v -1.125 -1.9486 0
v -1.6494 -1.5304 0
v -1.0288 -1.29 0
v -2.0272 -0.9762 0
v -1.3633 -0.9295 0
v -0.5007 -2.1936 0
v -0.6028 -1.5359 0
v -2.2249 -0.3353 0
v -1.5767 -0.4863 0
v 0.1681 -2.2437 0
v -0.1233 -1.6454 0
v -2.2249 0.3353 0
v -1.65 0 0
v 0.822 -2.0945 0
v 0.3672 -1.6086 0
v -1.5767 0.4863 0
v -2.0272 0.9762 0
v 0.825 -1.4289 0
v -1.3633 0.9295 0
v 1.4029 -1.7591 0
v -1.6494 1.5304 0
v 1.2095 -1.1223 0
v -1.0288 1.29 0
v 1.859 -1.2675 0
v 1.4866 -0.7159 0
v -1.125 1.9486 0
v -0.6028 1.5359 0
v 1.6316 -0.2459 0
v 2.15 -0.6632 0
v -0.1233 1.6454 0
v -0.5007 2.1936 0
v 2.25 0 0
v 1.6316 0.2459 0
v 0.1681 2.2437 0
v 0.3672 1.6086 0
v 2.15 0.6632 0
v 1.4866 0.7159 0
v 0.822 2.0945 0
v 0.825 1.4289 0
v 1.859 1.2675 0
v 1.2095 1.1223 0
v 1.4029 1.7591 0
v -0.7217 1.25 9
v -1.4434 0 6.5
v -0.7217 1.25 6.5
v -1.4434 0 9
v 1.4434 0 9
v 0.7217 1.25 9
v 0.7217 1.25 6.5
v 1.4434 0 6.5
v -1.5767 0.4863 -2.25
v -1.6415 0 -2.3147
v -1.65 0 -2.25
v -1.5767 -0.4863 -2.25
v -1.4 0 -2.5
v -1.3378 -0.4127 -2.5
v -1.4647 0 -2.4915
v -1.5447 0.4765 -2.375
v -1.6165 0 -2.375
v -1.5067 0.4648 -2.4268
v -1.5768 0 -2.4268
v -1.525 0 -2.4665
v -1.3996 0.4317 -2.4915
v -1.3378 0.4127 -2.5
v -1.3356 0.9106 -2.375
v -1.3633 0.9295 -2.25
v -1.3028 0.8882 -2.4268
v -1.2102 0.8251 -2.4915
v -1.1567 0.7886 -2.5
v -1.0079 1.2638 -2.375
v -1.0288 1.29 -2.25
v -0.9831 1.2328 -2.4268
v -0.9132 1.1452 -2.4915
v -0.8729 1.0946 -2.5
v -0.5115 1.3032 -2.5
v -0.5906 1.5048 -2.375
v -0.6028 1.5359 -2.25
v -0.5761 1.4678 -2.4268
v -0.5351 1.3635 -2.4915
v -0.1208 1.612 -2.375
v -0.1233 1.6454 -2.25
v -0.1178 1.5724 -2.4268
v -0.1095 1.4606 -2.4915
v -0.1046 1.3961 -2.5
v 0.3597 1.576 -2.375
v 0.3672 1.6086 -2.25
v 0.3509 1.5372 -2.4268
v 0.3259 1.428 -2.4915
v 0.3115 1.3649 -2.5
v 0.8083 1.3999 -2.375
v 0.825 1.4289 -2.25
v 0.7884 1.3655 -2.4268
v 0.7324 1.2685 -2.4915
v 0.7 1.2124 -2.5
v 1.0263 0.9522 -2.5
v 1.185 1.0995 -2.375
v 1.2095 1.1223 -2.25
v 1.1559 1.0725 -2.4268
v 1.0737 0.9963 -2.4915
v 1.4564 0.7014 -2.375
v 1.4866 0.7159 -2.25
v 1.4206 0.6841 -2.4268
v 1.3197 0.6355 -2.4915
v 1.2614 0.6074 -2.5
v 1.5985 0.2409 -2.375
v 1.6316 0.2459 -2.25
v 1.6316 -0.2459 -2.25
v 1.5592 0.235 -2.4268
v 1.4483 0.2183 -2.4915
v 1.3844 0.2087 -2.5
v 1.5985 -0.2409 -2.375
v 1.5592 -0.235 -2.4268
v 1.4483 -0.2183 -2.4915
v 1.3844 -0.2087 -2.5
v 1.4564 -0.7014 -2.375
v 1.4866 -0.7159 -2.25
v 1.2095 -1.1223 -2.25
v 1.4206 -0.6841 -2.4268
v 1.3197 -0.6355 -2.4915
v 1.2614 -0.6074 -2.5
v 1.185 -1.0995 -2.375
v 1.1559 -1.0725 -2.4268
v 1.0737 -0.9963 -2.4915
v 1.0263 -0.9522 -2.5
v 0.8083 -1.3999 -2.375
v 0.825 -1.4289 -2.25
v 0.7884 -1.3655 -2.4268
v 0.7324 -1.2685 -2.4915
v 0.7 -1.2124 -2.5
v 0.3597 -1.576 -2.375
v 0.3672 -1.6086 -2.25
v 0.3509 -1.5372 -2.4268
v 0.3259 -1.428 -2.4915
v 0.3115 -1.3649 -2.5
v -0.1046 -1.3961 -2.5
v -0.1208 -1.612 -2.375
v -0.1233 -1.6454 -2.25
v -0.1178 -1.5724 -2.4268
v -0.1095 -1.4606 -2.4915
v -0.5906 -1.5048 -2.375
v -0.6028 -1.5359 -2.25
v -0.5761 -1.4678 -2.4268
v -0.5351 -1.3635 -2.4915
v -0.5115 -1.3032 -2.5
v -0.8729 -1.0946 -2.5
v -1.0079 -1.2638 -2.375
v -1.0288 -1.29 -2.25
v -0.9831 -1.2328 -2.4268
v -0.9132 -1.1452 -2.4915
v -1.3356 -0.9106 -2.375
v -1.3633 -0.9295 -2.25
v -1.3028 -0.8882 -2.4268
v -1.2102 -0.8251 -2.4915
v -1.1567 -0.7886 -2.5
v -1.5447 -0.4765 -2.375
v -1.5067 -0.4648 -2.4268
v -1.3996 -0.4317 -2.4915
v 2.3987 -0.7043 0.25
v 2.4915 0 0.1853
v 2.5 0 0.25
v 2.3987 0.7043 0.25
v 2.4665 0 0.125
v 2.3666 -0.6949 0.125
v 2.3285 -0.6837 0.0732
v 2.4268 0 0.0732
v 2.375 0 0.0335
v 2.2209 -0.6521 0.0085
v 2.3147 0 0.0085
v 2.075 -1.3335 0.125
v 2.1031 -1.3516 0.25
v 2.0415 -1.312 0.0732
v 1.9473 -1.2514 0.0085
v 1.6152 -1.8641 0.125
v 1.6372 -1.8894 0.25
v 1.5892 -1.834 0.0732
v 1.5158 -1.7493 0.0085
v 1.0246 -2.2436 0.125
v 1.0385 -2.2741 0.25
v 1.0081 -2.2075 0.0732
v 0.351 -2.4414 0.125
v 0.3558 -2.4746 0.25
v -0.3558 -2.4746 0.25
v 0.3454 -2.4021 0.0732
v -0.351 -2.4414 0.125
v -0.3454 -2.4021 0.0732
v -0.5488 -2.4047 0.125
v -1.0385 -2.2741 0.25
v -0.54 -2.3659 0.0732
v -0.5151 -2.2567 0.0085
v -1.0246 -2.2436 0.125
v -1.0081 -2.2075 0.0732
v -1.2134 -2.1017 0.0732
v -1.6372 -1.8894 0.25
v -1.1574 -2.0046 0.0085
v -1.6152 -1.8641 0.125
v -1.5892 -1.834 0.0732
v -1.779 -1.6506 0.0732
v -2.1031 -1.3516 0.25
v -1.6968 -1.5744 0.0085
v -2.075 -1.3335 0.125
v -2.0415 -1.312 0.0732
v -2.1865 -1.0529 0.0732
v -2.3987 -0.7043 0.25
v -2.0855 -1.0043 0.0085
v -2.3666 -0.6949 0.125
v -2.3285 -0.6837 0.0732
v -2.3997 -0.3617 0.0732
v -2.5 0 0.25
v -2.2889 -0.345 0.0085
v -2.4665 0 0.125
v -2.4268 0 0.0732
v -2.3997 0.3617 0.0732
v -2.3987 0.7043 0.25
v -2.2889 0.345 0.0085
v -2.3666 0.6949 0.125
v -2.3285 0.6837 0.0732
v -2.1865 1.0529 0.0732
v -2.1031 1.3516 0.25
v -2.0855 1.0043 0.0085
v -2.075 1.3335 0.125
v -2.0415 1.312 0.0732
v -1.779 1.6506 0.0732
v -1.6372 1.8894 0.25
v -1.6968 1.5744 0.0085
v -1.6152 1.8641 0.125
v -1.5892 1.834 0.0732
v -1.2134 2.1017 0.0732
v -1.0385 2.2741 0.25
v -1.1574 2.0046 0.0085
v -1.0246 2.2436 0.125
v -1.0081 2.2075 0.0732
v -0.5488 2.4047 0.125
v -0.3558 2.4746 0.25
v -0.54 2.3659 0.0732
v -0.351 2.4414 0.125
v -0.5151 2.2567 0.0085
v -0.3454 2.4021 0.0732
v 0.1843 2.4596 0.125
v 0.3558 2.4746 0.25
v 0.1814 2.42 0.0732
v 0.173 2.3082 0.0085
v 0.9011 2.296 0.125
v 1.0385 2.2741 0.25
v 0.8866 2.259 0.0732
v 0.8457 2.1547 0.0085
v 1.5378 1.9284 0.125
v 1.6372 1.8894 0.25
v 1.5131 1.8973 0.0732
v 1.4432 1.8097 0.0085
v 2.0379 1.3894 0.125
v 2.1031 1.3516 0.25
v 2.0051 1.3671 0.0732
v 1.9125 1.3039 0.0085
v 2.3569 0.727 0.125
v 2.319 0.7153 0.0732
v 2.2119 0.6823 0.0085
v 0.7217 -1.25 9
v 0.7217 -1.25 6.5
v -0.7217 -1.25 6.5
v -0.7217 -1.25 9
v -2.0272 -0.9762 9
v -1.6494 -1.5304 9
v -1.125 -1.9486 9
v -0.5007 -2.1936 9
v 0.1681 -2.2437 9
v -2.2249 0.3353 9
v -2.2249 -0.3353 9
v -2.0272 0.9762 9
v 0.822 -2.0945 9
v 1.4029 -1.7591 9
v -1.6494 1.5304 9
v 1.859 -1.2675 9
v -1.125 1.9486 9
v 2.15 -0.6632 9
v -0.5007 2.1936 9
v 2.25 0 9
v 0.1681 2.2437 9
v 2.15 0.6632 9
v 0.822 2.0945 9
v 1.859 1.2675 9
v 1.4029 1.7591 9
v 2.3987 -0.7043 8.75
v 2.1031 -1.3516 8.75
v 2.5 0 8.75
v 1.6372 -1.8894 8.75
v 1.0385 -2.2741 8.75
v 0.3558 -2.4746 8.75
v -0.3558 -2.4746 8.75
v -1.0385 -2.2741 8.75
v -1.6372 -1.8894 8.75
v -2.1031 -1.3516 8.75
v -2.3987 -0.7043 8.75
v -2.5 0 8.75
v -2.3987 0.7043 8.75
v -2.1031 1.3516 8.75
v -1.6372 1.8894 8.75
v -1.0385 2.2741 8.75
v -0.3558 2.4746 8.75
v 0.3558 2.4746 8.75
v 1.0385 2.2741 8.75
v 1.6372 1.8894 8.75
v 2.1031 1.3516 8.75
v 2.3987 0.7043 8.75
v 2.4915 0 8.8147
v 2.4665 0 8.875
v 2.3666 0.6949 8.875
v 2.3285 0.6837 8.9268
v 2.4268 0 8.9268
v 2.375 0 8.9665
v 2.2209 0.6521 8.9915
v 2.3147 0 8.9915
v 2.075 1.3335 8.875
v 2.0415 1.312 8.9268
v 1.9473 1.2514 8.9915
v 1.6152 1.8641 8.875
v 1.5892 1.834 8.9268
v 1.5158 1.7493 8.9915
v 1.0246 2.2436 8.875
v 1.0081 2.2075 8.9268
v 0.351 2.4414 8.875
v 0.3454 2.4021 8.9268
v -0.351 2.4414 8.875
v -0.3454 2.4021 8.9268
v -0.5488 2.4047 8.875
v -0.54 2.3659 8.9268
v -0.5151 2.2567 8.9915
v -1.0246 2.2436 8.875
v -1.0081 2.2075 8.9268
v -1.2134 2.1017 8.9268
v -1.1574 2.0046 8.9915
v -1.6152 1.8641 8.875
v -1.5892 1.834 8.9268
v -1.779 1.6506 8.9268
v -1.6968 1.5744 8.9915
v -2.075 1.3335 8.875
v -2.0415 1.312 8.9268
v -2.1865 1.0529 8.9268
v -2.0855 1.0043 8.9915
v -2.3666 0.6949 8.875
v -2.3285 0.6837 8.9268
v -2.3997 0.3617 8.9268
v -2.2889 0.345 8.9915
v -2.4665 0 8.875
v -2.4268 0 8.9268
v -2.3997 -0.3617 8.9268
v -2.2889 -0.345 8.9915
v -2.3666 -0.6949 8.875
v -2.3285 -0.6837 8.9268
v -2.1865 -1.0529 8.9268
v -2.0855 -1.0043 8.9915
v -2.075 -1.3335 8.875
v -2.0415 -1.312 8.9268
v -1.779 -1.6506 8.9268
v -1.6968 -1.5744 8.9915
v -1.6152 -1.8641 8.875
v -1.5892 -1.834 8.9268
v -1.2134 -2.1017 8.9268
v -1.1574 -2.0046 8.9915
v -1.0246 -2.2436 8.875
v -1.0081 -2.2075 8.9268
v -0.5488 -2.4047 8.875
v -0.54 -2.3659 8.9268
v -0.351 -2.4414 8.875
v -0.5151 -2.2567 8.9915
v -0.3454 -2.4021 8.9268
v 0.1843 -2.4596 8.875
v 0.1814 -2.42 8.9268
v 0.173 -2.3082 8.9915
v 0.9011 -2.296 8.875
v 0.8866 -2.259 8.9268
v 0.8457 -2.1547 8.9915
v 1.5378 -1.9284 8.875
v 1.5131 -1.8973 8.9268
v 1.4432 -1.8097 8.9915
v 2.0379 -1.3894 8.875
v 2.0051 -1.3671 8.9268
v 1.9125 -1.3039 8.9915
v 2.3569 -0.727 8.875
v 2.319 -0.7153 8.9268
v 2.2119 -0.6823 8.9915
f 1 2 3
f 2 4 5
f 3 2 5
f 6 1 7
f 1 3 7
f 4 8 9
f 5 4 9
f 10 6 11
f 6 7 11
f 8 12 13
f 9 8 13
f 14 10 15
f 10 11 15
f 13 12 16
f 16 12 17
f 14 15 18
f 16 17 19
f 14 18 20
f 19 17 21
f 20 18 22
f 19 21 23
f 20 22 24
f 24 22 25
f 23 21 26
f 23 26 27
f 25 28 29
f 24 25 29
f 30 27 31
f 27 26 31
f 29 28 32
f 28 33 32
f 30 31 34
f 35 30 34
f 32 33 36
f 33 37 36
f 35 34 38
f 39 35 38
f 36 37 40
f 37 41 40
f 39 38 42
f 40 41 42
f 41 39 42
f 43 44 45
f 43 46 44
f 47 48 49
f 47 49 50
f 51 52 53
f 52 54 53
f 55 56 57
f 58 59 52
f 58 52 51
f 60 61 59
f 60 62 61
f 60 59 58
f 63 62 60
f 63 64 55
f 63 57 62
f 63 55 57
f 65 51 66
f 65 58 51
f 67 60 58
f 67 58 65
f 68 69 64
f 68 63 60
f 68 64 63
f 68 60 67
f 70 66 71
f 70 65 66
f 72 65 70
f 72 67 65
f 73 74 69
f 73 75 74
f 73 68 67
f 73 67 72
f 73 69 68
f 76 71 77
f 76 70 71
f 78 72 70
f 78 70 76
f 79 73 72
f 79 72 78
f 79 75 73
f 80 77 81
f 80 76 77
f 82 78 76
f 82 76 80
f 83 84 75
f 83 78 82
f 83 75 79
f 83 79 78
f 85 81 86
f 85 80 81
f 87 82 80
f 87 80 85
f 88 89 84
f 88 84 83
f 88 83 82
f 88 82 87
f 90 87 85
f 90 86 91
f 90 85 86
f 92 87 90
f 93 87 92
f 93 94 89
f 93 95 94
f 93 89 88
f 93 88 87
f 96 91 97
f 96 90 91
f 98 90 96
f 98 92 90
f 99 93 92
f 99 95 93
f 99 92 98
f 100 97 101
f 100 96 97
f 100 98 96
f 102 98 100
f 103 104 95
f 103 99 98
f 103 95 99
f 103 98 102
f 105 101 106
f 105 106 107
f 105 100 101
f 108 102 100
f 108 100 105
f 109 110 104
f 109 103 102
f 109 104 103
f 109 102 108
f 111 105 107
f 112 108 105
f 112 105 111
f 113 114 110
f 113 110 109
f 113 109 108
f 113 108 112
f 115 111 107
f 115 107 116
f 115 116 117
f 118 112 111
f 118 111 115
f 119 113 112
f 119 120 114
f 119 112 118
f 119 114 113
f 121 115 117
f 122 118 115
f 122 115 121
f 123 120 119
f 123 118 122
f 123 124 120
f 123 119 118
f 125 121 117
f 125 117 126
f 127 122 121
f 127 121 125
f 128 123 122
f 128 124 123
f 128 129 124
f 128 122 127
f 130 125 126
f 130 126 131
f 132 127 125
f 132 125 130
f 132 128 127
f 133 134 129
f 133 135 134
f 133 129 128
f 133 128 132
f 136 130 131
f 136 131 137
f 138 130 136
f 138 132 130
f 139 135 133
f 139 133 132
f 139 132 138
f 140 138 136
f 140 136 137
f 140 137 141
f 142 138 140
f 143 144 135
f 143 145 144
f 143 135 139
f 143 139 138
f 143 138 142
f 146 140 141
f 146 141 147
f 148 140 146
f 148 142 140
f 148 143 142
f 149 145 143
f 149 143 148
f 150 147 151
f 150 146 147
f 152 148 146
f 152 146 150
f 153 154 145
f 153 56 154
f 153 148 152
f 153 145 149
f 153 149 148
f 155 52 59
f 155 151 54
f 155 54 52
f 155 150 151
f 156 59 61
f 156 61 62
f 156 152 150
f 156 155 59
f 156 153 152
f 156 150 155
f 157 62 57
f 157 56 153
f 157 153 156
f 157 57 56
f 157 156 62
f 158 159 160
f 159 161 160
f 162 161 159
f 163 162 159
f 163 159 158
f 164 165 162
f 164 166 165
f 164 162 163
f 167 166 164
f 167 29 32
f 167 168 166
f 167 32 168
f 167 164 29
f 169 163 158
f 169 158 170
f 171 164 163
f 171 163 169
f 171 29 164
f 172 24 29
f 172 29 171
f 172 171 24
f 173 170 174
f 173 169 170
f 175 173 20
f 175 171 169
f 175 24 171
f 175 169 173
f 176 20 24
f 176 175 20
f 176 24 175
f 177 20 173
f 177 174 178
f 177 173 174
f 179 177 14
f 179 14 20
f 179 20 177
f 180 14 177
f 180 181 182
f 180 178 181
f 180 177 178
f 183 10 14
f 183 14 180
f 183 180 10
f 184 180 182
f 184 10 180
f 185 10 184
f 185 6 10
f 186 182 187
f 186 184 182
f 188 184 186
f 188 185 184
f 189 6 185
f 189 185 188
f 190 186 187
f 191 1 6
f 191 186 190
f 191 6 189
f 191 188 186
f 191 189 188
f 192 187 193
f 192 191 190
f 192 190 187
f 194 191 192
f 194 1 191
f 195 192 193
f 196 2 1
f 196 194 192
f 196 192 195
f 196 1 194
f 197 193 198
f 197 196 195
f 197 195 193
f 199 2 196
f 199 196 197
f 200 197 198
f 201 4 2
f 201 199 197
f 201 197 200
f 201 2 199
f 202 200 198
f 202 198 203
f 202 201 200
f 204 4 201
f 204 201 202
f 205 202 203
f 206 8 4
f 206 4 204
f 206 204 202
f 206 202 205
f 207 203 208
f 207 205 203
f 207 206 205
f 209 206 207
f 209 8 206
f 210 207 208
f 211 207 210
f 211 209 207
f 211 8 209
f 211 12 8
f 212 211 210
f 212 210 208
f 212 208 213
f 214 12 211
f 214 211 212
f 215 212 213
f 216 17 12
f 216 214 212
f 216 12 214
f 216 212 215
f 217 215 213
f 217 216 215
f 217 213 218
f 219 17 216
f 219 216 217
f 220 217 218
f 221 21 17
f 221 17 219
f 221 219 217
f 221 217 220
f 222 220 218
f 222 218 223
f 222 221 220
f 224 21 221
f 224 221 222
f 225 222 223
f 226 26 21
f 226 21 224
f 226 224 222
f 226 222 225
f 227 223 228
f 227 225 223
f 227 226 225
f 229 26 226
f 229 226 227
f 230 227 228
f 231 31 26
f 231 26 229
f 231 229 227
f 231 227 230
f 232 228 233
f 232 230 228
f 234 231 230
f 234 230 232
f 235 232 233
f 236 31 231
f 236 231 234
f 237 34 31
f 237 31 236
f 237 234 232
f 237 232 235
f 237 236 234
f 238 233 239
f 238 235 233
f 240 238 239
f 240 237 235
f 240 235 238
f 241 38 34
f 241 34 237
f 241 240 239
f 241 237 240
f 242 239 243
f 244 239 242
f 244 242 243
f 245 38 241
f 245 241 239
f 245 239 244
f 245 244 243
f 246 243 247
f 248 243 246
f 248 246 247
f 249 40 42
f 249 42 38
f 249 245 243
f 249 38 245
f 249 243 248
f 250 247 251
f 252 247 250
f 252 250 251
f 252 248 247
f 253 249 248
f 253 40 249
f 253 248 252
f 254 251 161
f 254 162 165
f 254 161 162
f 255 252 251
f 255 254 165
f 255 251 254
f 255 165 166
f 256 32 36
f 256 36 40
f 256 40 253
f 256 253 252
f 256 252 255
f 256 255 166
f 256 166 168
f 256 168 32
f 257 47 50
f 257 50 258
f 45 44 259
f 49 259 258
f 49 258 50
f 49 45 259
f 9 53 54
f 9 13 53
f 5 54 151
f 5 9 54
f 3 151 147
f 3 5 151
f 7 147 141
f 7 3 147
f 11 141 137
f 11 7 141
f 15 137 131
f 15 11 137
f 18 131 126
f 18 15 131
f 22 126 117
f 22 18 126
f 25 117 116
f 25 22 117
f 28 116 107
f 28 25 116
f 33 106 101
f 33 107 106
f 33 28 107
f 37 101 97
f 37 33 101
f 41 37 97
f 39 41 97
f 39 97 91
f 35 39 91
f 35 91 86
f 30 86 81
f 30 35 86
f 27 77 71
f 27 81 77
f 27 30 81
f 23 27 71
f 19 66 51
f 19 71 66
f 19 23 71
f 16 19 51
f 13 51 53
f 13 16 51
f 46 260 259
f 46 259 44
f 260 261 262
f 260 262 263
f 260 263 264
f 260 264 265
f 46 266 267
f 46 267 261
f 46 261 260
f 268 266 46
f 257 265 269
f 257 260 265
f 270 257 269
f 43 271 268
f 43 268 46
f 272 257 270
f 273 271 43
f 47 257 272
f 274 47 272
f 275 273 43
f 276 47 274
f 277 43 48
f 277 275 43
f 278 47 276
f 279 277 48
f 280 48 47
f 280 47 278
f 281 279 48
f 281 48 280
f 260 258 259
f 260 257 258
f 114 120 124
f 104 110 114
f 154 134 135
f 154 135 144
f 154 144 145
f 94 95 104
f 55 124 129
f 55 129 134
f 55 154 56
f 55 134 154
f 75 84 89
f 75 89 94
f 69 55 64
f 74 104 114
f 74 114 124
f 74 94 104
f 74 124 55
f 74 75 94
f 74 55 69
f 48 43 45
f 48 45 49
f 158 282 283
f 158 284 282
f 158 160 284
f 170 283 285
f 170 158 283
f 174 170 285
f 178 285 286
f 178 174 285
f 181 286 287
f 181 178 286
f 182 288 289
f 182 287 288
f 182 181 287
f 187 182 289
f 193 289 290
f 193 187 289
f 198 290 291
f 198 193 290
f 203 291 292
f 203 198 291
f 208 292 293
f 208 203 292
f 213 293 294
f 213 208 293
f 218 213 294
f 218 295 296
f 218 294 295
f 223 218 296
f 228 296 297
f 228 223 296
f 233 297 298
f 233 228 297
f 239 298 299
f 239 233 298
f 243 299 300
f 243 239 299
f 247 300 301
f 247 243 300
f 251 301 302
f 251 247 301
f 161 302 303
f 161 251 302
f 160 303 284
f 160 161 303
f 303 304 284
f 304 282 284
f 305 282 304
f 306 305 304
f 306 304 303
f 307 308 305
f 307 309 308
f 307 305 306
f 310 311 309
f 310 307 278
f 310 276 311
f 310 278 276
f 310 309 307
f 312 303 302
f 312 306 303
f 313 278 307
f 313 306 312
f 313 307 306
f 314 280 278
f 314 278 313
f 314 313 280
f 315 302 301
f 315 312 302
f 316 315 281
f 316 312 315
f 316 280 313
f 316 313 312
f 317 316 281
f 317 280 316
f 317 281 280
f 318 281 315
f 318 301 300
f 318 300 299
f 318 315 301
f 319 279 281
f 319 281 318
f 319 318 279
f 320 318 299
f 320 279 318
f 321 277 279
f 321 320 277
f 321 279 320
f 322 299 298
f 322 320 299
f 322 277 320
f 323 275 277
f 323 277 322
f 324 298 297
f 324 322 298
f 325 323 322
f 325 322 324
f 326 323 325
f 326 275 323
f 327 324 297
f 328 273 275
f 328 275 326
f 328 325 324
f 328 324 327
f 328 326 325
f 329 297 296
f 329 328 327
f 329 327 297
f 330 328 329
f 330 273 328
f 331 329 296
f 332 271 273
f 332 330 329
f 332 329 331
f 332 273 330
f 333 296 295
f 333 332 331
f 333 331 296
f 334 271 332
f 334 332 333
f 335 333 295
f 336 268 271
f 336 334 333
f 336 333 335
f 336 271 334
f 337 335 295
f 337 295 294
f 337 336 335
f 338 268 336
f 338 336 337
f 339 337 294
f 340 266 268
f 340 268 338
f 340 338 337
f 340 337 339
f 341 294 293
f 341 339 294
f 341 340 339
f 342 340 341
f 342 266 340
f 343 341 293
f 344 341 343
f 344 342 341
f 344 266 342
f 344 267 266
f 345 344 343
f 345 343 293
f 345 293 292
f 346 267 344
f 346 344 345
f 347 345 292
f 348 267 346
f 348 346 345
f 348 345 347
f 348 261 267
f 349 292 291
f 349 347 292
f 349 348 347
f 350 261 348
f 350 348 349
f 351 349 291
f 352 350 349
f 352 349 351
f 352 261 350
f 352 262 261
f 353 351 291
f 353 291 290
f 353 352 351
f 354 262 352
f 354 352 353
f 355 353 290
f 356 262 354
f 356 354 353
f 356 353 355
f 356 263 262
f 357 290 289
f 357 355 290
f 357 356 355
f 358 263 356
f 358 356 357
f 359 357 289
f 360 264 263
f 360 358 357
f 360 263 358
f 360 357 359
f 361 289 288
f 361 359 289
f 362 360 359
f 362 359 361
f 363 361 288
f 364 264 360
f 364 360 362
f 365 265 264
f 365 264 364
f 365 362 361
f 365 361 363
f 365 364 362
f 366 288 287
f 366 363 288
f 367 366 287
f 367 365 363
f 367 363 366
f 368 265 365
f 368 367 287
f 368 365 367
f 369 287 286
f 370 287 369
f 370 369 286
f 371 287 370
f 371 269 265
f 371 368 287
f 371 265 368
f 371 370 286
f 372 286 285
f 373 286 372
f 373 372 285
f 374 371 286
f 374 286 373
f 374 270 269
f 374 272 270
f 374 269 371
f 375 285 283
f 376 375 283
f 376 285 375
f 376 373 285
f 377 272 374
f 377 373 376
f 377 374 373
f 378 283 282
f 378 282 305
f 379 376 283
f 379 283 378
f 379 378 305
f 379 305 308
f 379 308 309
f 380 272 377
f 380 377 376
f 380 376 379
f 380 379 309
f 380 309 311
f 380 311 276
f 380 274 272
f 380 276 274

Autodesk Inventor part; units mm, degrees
ref_plane "YZ Plane" through (0, 0, 0) normal (1, 0, 0) x (0, 1, 0)
ref_plane "XZ Plane" through (0, 0, 0) normal (0, 1, 0) x (-1, 0, 0)
ref_plane "XY Plane" through (0, 0, 0) normal (0, 0, 1) x (1, 0, 0)
sketch "Esquisse1" plane through (0, 0, 0) normal (0, 0, 1) x (1, 0, 0)
  circle A0 centre (0, 0) radius 2.5
  dimension "d0" = 5
extrude "Extrusion1" add sketch "Esquisse1" along normal blind 9
sketch "Esquisse2" plane through (0, 0, 0) normal (0, 0, -1) x (-1, 0, 0)
  circle A0 centre (0, 0) radius 2.5 projected
  circle A1 centre (0, 0) radius 1.65
  dimension "d3" = 3.3
extrude "Extrusion2" add sketch "Esquisse2" along normal blind 2.5 contours A1
thread "Filetage1" size "M5x0.8" class "6g" standard "ANSI Metric M Profile" full length
sketch "Esquisse3" plane through (0, 0, 9) normal (0, 0, 1) x (1, 0, 0)
  line L0 (0.7217, 1.25) -> (1.4434, 0)
  line L1 (1.4434, 0) -> (0.7217, -1.25)
  line L2 (0.7217, -1.25) -> (-0.7217, -1.25)
  line L3 (-0.7217, -1.25) -> (-1.4434, 0)
  line L4 (-1.4434, 0) -> (-0.7217, 1.25)
  line L5 (-0.7217, 1.25) -> (0.7217, 1.25)
  point P0 (0, 0)
  point P1 (0, 0)
  dimension "d8" = 2.5
extrude "Extrusion3" cut sketch "Esquisse3" against normal blind 2.5
fillet "Congé1" radius 0.25 3 edges at (-2.5, 0, 9) (-2.5, 0, 0) (1.65, 0, -2.5)
properties part number "M5 pour ressort" material "----------"
